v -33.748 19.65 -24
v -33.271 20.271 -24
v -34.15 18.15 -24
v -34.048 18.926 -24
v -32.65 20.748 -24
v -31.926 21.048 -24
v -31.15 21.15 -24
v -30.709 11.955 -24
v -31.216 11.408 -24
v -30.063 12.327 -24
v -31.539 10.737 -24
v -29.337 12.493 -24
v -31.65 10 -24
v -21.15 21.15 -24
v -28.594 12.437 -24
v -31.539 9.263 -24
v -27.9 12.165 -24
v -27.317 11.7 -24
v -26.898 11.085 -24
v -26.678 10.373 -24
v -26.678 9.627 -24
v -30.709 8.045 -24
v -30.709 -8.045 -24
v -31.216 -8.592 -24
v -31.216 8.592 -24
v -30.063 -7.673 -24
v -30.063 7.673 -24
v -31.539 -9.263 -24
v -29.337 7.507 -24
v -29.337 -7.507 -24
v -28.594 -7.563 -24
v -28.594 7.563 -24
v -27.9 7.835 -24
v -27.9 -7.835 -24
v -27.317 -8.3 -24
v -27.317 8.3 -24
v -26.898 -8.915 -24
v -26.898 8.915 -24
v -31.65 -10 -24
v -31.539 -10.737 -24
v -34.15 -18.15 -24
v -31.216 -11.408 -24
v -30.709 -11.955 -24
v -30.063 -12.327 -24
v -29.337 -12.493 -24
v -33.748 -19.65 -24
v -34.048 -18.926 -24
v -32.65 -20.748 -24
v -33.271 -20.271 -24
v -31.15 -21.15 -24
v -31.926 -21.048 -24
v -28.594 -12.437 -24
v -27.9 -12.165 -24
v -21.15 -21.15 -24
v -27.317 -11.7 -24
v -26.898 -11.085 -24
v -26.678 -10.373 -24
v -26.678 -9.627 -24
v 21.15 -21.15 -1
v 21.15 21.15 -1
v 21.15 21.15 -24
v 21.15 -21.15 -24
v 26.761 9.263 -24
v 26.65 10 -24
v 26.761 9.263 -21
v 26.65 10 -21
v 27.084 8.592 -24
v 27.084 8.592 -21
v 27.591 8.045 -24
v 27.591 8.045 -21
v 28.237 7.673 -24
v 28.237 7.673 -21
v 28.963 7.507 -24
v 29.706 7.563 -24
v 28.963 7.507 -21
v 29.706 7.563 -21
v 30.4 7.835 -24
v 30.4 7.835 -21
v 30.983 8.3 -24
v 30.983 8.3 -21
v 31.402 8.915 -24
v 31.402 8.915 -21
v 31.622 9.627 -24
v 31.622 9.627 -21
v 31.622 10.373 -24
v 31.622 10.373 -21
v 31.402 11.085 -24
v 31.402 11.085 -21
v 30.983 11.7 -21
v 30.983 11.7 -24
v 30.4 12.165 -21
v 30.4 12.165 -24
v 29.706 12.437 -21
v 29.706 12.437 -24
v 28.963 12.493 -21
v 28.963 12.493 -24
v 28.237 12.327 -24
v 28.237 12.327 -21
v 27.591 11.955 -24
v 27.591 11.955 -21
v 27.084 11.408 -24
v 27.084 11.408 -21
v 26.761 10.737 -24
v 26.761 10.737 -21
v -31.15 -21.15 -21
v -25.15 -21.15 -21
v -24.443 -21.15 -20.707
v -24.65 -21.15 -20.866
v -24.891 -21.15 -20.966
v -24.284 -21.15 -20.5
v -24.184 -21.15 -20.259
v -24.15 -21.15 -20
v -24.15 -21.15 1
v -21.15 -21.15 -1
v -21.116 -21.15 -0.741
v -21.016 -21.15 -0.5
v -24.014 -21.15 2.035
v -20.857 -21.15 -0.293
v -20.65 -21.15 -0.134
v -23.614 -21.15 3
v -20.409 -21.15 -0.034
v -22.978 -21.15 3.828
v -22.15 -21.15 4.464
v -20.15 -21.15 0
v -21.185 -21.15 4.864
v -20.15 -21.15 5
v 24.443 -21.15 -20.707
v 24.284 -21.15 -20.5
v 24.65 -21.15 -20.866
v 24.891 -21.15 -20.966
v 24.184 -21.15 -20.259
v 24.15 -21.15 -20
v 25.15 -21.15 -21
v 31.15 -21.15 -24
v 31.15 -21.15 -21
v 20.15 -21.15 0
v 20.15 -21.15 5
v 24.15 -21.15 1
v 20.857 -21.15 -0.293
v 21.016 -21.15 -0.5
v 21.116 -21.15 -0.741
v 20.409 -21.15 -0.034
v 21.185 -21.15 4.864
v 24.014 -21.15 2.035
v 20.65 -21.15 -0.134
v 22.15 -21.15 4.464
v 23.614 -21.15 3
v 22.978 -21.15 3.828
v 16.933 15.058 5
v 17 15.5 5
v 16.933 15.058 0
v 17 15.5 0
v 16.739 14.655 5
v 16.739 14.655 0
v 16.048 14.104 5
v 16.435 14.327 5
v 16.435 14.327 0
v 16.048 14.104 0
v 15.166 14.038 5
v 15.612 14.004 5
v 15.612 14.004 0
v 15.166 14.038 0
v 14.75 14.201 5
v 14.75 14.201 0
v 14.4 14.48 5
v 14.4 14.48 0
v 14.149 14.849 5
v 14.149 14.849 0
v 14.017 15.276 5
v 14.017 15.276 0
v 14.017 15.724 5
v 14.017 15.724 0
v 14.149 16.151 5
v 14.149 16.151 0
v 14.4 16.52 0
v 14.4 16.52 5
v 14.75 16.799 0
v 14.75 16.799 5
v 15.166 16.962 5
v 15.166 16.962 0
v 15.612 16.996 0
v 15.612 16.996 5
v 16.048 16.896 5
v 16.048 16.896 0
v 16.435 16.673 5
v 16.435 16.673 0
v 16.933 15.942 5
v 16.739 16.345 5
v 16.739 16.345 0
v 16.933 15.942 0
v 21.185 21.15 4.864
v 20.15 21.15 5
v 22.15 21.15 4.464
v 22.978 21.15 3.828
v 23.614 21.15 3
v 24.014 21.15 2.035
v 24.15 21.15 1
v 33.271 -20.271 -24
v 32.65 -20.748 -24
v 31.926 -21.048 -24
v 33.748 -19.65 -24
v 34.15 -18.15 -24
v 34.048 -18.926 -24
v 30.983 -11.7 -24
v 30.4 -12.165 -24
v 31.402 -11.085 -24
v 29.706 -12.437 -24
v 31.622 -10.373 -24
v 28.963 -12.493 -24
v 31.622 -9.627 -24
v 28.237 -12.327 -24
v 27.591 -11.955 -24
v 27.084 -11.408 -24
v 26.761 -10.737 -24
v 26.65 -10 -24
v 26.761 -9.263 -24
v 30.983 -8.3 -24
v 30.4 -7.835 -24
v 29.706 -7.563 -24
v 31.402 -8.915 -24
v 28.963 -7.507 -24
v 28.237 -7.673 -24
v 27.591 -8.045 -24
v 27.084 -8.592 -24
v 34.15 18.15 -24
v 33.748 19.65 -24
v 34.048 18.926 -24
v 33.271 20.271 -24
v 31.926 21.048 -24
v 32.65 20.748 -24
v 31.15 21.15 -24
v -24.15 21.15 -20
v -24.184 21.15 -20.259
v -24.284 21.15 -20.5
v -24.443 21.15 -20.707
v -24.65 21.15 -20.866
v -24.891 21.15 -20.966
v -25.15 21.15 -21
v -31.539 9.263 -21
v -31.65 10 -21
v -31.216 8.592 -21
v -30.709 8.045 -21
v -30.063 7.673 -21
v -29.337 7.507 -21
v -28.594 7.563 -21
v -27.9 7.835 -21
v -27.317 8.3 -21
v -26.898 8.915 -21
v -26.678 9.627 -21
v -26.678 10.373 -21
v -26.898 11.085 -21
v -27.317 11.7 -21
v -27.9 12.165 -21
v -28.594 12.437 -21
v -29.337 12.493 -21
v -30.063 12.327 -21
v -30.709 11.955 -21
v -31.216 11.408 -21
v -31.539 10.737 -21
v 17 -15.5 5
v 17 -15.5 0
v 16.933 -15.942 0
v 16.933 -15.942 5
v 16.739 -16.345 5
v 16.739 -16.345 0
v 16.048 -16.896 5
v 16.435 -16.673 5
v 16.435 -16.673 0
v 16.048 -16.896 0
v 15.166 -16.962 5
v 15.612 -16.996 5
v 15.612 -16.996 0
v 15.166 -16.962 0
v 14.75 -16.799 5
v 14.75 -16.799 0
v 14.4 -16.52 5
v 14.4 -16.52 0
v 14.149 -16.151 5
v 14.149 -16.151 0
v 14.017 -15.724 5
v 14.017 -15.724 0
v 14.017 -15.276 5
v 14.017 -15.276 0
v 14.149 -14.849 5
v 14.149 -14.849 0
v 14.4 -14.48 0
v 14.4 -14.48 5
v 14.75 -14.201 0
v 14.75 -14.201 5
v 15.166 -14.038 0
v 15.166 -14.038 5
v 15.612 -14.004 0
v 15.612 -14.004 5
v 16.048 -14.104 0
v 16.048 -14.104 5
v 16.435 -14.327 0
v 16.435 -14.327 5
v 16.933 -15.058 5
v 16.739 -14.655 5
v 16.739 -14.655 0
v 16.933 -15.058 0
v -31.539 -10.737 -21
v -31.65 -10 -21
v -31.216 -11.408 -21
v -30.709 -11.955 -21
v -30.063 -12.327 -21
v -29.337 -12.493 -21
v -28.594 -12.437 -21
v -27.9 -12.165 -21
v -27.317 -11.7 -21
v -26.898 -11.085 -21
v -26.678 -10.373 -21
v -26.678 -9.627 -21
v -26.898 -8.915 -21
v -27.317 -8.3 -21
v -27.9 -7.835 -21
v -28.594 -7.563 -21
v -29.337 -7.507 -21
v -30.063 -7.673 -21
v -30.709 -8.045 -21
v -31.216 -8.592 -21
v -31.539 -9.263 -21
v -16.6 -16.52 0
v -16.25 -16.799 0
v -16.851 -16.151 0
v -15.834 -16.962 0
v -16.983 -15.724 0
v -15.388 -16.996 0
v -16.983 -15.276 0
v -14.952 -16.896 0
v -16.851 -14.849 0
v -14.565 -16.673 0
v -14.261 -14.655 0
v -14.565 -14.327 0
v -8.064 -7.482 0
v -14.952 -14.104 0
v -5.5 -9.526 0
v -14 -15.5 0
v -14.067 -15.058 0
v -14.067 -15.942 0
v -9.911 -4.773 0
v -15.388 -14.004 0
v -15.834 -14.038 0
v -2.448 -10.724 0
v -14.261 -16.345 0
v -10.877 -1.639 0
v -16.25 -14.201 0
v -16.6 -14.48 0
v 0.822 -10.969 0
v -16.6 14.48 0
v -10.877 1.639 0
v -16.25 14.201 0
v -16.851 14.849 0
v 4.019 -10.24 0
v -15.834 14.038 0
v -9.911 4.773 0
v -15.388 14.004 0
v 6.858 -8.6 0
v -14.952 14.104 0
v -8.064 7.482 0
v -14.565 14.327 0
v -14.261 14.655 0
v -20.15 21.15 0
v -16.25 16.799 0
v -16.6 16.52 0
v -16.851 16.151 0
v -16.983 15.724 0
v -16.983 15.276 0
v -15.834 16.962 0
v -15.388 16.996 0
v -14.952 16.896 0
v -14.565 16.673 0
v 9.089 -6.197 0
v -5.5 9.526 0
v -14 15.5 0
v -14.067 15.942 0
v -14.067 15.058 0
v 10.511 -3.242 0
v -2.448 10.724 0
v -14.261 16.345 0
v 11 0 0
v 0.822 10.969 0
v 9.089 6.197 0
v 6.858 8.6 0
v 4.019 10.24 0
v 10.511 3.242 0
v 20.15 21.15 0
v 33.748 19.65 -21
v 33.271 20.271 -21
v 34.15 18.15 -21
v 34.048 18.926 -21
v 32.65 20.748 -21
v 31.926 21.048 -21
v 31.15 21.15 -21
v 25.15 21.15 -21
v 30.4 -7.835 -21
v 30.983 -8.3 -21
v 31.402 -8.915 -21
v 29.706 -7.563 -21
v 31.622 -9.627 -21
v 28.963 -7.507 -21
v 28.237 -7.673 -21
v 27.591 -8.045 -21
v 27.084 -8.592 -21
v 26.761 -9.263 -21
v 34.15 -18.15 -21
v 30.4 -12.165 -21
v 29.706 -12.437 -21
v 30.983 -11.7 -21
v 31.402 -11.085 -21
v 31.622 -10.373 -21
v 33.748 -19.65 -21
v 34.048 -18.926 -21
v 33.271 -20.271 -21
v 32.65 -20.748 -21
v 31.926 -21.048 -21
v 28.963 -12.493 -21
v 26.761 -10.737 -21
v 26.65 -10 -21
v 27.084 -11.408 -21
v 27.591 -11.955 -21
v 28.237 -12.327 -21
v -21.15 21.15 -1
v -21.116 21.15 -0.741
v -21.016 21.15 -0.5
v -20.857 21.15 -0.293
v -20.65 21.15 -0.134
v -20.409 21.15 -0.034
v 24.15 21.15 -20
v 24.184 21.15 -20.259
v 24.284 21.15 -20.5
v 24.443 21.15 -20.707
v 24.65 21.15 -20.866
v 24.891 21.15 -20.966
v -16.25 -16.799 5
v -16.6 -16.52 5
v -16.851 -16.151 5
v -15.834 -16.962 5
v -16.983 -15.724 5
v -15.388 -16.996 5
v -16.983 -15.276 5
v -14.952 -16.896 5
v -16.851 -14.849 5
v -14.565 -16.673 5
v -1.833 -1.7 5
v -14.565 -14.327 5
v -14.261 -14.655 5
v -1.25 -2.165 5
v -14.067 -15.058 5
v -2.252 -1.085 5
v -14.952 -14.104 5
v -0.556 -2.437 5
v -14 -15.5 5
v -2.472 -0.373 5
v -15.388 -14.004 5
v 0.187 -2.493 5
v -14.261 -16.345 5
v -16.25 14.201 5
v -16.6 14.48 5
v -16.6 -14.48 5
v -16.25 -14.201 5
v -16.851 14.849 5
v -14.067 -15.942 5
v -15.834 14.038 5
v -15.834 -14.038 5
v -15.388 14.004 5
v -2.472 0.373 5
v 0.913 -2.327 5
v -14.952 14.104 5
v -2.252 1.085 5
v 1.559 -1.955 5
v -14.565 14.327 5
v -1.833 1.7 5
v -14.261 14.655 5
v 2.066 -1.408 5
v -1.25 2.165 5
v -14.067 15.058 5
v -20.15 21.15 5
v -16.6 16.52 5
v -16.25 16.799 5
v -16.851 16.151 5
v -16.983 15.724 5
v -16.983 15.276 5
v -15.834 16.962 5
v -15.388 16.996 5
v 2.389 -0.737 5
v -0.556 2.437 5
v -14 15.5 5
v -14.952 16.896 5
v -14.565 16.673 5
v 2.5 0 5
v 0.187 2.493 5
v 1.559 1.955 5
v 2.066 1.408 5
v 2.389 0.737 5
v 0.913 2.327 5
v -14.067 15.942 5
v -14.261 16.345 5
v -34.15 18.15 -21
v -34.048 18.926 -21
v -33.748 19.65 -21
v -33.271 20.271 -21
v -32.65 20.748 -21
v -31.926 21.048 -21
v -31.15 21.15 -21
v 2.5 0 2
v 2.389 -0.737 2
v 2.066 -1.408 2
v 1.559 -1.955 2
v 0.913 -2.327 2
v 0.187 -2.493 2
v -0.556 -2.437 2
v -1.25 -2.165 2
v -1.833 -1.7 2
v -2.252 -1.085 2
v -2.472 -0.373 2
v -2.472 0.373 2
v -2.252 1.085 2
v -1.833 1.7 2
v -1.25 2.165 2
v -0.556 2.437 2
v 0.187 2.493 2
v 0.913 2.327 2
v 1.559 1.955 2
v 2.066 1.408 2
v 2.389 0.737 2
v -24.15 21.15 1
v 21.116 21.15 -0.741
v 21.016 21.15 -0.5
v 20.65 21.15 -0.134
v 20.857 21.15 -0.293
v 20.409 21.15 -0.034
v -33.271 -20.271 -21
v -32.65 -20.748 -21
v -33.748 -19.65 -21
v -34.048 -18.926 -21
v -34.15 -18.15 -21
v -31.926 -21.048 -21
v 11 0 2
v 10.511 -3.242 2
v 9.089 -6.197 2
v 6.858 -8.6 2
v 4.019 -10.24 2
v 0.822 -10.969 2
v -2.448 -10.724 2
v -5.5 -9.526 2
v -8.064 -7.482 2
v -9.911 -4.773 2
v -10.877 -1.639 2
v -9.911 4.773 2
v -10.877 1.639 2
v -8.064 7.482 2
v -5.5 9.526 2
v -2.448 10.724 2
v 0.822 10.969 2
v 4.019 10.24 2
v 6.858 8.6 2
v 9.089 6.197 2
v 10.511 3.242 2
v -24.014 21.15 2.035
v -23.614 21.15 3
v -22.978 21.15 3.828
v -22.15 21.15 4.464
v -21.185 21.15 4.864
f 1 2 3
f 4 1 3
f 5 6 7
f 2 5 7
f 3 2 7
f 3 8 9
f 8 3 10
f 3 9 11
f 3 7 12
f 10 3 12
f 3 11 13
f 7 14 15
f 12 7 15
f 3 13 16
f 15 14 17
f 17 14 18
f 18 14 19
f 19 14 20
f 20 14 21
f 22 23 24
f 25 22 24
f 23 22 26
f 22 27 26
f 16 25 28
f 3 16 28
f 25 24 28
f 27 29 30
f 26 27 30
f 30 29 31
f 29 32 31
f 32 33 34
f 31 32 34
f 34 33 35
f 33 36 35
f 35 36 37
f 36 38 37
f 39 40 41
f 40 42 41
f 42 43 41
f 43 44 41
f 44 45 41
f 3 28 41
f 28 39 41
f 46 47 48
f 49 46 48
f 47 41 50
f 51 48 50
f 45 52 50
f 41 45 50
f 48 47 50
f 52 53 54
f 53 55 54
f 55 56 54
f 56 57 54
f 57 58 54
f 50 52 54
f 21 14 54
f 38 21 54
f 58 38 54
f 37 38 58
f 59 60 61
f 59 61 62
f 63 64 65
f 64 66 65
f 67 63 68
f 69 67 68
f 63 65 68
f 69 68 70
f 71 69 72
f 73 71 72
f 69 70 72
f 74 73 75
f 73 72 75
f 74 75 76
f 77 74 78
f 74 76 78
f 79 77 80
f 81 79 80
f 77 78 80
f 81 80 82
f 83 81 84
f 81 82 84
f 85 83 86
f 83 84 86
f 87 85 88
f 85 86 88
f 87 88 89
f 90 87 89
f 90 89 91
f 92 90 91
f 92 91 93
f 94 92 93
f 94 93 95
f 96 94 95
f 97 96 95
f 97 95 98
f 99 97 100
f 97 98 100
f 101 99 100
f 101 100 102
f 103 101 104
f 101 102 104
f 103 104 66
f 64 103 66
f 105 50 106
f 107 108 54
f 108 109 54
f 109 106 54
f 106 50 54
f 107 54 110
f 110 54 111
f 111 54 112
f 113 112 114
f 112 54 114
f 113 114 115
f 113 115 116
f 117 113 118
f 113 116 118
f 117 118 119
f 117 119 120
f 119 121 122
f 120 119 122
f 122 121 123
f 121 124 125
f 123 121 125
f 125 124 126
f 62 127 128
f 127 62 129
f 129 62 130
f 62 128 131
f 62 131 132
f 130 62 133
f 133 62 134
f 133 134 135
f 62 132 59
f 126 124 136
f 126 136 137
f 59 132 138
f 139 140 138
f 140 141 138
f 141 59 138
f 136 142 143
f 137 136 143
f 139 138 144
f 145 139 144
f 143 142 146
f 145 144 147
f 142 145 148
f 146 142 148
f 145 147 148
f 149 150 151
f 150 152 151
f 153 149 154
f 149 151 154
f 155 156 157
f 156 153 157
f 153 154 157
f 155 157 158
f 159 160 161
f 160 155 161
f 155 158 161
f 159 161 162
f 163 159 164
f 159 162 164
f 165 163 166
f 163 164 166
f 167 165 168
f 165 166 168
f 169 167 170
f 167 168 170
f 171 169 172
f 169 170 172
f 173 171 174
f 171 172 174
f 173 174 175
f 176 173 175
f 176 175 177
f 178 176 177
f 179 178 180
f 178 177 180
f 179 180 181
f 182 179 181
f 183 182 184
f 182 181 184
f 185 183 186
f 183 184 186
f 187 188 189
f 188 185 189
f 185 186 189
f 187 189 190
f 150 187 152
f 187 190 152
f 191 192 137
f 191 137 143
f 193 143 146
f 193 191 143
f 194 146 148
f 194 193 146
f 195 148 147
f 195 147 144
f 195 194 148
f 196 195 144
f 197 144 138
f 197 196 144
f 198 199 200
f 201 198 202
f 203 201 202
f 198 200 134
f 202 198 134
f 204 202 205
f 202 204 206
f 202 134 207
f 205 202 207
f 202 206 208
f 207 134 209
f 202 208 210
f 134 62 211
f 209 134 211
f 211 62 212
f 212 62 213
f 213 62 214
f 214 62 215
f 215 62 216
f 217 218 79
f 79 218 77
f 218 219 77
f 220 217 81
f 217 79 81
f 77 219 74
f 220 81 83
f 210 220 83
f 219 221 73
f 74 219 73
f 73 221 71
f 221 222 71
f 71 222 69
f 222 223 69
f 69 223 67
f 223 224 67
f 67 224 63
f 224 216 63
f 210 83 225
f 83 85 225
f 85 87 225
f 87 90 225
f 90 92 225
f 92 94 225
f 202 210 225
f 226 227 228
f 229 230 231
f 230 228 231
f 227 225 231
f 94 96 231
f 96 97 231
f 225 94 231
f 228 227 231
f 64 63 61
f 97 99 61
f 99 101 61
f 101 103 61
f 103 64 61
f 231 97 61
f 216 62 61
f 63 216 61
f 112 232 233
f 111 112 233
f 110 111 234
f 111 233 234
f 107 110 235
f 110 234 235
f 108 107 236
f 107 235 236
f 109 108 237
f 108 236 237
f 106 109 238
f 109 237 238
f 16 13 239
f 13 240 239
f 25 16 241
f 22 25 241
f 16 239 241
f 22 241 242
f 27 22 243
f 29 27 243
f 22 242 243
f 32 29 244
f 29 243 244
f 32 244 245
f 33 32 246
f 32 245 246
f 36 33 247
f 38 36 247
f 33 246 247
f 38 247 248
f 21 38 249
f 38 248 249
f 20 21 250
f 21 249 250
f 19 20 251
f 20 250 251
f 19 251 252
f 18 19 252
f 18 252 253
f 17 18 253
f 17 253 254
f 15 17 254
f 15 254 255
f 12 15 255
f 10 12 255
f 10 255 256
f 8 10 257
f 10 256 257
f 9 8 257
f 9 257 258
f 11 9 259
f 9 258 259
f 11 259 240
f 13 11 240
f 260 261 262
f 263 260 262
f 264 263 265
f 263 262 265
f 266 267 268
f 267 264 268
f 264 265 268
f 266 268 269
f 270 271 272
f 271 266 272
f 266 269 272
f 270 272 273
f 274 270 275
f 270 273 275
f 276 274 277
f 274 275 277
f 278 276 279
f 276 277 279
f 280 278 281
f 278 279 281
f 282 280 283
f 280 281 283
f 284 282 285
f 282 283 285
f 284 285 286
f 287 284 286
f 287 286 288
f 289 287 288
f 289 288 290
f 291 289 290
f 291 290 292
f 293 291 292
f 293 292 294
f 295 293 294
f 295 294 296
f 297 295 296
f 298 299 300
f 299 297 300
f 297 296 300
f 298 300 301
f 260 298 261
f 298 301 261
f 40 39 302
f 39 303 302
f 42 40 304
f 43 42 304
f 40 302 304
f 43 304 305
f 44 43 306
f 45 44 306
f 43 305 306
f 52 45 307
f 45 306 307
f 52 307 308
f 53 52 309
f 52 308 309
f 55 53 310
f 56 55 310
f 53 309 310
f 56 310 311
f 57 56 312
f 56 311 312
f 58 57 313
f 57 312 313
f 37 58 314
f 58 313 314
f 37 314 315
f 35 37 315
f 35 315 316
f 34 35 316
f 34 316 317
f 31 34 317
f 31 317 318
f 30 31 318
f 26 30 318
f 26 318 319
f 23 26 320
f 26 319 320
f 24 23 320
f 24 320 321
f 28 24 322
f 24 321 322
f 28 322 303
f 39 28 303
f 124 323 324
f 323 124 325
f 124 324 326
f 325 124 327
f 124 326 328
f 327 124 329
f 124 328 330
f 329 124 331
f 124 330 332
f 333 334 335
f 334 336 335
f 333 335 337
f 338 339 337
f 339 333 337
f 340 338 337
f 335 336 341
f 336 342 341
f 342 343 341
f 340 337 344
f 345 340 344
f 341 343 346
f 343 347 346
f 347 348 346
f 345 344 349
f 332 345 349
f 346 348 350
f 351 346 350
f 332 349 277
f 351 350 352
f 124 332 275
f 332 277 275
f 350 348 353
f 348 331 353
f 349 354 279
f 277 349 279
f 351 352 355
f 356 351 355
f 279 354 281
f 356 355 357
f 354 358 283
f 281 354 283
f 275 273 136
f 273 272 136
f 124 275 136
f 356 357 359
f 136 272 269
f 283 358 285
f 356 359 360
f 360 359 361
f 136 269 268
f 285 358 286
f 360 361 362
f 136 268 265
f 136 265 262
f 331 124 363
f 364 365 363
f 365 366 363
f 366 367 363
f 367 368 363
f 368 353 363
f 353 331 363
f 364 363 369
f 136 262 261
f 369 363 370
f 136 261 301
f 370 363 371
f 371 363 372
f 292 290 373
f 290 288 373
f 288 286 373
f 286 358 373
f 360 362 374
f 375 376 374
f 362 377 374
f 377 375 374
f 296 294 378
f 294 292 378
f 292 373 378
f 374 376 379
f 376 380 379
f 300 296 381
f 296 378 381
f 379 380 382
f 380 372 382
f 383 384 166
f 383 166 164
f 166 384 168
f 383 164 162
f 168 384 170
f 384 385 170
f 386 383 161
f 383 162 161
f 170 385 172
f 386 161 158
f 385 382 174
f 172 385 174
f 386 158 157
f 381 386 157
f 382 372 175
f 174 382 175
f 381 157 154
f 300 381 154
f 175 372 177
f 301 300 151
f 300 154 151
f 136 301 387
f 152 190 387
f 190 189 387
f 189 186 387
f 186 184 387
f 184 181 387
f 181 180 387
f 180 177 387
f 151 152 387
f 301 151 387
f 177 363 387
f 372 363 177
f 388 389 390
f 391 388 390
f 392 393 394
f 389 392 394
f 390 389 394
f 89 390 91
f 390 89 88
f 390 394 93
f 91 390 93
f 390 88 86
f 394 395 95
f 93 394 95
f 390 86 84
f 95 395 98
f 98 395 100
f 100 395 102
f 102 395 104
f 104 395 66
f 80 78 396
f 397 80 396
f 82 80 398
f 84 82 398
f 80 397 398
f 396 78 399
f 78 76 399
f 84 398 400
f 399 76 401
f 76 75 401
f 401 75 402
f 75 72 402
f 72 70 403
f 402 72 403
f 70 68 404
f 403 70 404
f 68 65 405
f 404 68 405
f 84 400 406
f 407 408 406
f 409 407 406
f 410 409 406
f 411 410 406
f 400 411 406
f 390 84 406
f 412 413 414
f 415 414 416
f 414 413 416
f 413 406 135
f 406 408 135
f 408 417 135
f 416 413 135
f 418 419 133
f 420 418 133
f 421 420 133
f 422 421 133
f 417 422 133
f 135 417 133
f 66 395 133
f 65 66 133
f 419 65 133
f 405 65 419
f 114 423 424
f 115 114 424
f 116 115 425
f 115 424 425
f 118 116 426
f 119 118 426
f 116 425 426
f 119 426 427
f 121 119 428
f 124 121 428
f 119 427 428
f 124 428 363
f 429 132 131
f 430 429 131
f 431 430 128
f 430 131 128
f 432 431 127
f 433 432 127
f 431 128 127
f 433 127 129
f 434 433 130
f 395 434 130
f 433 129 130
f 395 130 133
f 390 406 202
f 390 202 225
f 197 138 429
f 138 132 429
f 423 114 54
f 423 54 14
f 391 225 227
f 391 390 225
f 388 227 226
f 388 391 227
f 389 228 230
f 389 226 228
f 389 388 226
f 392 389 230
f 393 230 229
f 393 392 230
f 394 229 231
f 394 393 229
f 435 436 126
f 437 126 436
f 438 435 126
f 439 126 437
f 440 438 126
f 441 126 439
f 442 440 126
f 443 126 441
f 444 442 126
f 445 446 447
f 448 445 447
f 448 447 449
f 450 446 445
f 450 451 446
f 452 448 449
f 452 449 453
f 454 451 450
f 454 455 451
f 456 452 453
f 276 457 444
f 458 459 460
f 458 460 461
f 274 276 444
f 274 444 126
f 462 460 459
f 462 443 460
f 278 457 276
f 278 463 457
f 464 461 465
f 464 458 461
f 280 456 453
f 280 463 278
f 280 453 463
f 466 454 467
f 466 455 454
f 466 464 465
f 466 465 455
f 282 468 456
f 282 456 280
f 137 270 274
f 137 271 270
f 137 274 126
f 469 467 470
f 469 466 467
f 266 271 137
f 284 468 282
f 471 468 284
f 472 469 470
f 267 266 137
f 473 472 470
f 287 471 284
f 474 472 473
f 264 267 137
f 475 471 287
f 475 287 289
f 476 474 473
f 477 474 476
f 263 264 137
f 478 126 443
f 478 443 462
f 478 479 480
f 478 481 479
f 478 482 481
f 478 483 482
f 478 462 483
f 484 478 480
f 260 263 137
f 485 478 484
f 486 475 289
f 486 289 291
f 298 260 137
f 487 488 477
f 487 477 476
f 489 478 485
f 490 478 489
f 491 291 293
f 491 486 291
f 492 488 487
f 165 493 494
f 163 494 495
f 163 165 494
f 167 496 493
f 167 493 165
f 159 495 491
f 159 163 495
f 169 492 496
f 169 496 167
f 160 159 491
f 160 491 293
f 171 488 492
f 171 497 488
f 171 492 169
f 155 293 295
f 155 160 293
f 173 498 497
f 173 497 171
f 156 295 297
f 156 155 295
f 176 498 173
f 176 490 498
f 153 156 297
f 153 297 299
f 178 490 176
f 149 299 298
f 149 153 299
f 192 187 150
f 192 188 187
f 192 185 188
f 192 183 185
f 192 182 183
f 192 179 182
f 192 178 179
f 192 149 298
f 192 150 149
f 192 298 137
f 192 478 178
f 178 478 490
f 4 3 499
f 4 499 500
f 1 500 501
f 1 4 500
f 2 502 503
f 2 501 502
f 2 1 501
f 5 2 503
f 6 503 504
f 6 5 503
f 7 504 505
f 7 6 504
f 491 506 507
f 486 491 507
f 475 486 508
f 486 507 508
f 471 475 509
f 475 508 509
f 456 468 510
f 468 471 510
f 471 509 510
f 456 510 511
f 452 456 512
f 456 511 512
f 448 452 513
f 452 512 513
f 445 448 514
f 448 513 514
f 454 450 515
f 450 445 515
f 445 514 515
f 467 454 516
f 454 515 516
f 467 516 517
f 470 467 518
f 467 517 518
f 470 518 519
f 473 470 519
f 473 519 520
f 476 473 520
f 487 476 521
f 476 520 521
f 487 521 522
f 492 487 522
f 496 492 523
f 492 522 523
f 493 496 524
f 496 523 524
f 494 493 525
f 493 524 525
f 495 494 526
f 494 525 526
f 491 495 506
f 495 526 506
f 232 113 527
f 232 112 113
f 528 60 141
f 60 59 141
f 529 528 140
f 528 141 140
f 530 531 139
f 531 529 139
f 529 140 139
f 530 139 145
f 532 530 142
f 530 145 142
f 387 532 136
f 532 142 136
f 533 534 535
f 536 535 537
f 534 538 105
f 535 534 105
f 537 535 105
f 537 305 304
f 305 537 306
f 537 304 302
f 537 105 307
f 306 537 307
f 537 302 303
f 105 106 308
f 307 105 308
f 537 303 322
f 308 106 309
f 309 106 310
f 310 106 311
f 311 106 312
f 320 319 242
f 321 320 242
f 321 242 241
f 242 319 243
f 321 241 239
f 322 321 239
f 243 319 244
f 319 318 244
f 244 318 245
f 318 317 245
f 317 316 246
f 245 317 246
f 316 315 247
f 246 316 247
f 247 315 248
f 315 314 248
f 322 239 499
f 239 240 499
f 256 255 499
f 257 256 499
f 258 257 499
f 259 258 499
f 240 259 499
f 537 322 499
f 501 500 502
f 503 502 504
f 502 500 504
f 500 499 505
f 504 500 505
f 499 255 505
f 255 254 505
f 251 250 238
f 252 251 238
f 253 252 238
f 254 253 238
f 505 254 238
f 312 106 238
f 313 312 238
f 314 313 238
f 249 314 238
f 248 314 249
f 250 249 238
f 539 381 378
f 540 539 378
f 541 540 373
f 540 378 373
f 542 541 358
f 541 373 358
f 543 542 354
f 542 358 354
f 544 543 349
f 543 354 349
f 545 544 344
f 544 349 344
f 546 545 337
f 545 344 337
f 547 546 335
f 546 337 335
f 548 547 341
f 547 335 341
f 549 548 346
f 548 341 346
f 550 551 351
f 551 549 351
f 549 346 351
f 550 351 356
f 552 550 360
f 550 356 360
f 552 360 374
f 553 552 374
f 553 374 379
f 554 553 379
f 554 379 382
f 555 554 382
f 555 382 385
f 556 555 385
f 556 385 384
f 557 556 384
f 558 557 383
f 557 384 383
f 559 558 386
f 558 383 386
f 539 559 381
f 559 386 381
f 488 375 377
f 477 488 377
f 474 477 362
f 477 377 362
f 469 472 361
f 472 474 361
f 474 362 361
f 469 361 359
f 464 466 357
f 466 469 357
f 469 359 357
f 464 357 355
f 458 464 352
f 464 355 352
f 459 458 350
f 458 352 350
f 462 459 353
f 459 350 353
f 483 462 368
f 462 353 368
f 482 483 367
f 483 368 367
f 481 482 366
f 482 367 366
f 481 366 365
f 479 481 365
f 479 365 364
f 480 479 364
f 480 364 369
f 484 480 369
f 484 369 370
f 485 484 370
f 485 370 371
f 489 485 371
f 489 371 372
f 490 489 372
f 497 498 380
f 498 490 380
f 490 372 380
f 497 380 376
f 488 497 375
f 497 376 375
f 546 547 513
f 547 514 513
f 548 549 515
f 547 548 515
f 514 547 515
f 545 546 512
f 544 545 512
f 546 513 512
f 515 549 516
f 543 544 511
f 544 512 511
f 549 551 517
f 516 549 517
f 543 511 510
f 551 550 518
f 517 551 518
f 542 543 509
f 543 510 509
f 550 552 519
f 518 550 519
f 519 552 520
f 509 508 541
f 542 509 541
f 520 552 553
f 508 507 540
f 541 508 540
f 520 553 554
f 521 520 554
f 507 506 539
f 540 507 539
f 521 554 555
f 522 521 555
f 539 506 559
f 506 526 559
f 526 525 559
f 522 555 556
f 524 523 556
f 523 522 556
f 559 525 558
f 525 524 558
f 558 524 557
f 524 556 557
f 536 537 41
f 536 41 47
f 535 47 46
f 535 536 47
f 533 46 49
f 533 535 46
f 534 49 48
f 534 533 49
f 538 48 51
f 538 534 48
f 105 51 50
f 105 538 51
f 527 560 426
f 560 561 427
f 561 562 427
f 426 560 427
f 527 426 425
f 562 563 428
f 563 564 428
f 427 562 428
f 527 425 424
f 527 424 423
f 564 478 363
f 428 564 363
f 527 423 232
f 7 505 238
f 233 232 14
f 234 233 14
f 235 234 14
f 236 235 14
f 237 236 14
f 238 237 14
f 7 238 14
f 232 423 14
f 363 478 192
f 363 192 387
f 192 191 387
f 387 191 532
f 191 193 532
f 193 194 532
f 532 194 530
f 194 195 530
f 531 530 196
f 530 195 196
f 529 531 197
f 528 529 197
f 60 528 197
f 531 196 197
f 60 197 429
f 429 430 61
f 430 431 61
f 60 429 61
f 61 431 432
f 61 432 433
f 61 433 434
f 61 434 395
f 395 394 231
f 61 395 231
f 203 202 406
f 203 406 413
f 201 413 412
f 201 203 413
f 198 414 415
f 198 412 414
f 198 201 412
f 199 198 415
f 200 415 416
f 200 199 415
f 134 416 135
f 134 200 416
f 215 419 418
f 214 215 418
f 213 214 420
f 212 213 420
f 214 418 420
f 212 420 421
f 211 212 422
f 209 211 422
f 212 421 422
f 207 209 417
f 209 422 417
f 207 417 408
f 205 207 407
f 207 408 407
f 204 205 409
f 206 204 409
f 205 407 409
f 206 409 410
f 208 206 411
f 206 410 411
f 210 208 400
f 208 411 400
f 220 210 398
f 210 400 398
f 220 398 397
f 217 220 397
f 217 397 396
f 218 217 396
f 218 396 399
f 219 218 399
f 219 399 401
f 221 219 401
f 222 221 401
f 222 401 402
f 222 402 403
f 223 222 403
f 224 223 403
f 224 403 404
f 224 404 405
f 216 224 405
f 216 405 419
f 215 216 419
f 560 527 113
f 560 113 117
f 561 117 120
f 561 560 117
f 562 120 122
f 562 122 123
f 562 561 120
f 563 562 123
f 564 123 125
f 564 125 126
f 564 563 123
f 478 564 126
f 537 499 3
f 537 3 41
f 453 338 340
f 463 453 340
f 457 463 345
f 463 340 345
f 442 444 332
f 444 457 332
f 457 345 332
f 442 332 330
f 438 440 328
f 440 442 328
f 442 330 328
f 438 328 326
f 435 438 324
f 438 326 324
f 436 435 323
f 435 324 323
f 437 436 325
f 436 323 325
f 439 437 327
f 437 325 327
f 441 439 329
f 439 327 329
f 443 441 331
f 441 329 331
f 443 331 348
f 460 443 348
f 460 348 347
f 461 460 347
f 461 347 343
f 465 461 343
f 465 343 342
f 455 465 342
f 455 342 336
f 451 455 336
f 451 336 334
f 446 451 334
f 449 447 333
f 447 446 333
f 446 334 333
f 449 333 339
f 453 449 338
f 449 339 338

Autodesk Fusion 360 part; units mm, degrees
sketch "Sketch1" plane through (0, 0, 0) normal (0, 0, 1) x (1, 0, 0)
  line L0 (-21.15, 21.15) -> (21.15, 21.15)
  line L1 (21.15, 21.15) -> (21.15, -21.15)
  line L2 (21.15, -21.15) -> (-21.15, -21.15)
  line L3 (-21.15, -21.15) -> (-21.15, 21.15)
  line L4 (-21.15, 21.15) -> (21.15, -21.15) construction
  line L5 (21.15, 21.15) -> (-21.15, -21.15) construction
  line L6 (-15.5, 15.5) -> (15.5, 15.5) construction
  line L7 (15.5, 15.5) -> (15.5, -15.5) construction
  line L8 (15.5, -15.5) -> (-15.5, -15.5) construction
  line L9 (-15.5, -15.5) -> (-15.5, 15.5) construction
  line L10 (-15.5, 15.5) -> (15.5, -15.5) construction
  line L11 (15.5, 15.5) -> (-15.5, -15.5) construction
  circle A0 centre (-15.5, 15.5) radius 1.5
  circle A1 centre (-15.5, -15.5) radius 1.5
  circle A2 centre (15.5, -15.5) radius 1.5
  circle A3 centre (15.5, 15.5) radius 1.5
  circle A4 centre (0, 0) radius 2.5
  circle A5 centre (0, 0) radius 11
  line L12 (-21.15, -21.15) -> (-24.15, -21.15)
  line L13 (-24.15, -21.15) -> (-24.15, 21.15)
  line L14 (-24.15, 21.15) -> (-21.15, 21.15)
  line L15 (-21.15, 21.15) -> (-21.15, -21.15)
  line L16 (21.15, -21.15) -> (24.15, -21.15)
  line L17 (24.15, -21.15) -> (24.15, 21.15)
  line L18 (24.15, 21.15) -> (21.15, 21.15)
  line L19 (21.15, 21.15) -> (21.15, -21.15)
  dimension "d1" = 42.3
  dimension "d2" = 42.3
  dimension "d5" = 31
  dimension "d6" = 31
  dimension "d8" = 3
  dimension "d10" = 360
  dimension "d12" = 5
  dimension "d14" = 22
  dimension "d17" = 3
  dimension "d18" = 42.3
  dimension "d19" = 3
  dimension "d20" = 42.3
extrude "Extrude1" add sketch "Sketch1" along normal blind 5 contours L0 L1 L2 L3 L15 L19 | L3 L12 L13 L14 L15 | L1 L16 L17 L18 L19 | A5
extrude "Extrude2" add sketch "Sketch1" against normal blind 24 contours L3 L12 L13 L14 L15 | L1 L16 L17 L18 L19
extrude "Extrude3" cut sketch "Sketch1" along normal blind 2 contours A5
sketch "Sketch2" plane through (24.15, 0, 0) normal (1, 0, 0) x (0, 1, 0)
  line L0 (-21.15, 5) -> (-21.15, -24)
  line L1 (-21.15, -24) -> (21.15, -24)
  line L2 (21.15, -24) -> (21.15, 5)
  line L3 (-21.15, -24) -> (21.15, -24)
  line L4 (21.15, -24) -> (21.15, -21)
  line L5 (21.15, -21) -> (-21.15, -21)
  line L6 (-21.15, -21) -> (-21.15, -24)
  line L7 (21.15, 5) -> (-21.15, 5)
  dimension "d28" = 42.3
  dimension "d29" = 3
extrude "Extrude4" add sketch "Sketch2" along normal blind 10 contours L0 L1 L2 L3 L4 L5 L6
sketch "Sketch3" plane through (-24.15, 0, 0) normal (-1, 0, 0) x (0, -1, 0)
  line L0 (21.15, -24) -> (21.15, 5)
  line L1 (21.15, 5) -> (-21.15, 5)
  line L2 (-21.15, 5) -> (-21.15, -24)
  line L3 (-21.15, -24) -> (21.15, -24)
  line L4 (-21.15, -24) -> (21.15, -24)
  line L5 (21.15, -24) -> (21.15, -21)
  line L6 (21.15, -21) -> (-21.15, -21)
  line L7 (-21.15, -21) -> (-21.15, -24)
  dimension "d32" = 42.3
  dimension "d33" = 3
extrude "Extrude5" add sketch "Sketch3" along normal blind 10 contours L0 L2 L3 L4 L5 L6 L7
sketch "Sketch4" plane through (0, 0, -21) normal (0, 0, 1) x (-1, 0, 0)
  line L0 (24.15, 21.15) -> (24.15, -21.15)
  line L1 (24.15, -21.15) -> (34.15, -21.15)
  line L2 (34.15, -21.15) -> (34.15, 21.15)
  line L3 (34.15, 21.15) -> (24.15, 21.15)
  line L4 (24.15, 0) -> (34.15, 0) construction
  line L5 (29.15, 0) -> (29.15, 10) construction
  circle A0 centre (29.15, 10) radius 2.5
  circle A1 centre (29.15, -10) radius 2.5
  dimension "d36" = 10
  dimension "d38" = 5
extrude "Extrude6" cut sketch "Sketch4" against normal blind 3 contours A0 | A1
sketch "Sketch5" plane through (0, 0, -21) normal (0, 0, 1) x (-1, 0, 0)
  line L0 (-24.15, -21.15) -> (-24.15, 21.15)
  line L1 (-24.15, 21.15) -> (-34.15, 21.15)
  line L2 (-34.15, 21.15) -> (-34.15, -21.15)
  line L3 (-34.15, -21.15) -> (-24.15, -21.15)
  line L4 (-34.15, 0) -> (-24.15, 0) construction
  line L5 (-29.15, 0) -> (-29.15, 10) construction
  circle A0 centre (-29.15, 10) radius 2.5
  circle A1 centre (-29.15, -10) radius 2.5
  dimension "d41" = 10
  dimension "d42" = 5
extrude "Extrude7" cut sketch "Sketch5" against normal blind 3 contours A0 | A1
fillet "Fillet1" radius 3 4 edges at (34.15, 21.15, -22.5) (34.15, -21.15, -22.5) (-34.15, 21.15, -22.5) (-34.15, -21.15, -22.5)
fillet "Fillet2" radius 4 2 edges at (24.15, 0, 5) (-24.15, 0, 5)
fillet "Fillet3" radius 1 2 edges at (21.15, 0, 0) (-21.15, 0, 0)
fillet "Fillet3" radius 1 2 edges at (24.15, 0, -21) (-24.15, 0, -21)
equation "d1 = nema_l"
equation "d2 = nema_l"
equation "nema_l = 42.3 mm"
equation "nema_spacing = 31 mm"
equation "d5 = nema_spacing"
equation "d6 = nema_spacing"
equation "nema_hole = 3 mm"
equation "d8 = nema_hole"
equation "nema_shaft = 5 mm"
equation "d12 = nema_shaft"
equation "nema_disc = 22 mm"
equation "d14 = nema_disc"
equation "thick_vert = 3 mm"
equation "thick_hori = 3 mm"
equation "d17 = thick_vert"
equation "d18 = nema_l"
equation "d19 = thick_vert"
equation "d20 = nema_l"
equation "d21 = 2 mm + thick_hori"
equation "height = 24 mm"
equation "d24 = -( height )"
equation "d28 = nema_l"
equation "d29 = thick_hori"
equation "d32 = nema_l"
equation "d33 = thick_hori"
equation "alu_hole = 5 mm"
equation "d38 = alu_hole"
equation "d39 = -thick_hori"
equation "d42 = alu_hole"
equation "d43 = -thick_hori"
